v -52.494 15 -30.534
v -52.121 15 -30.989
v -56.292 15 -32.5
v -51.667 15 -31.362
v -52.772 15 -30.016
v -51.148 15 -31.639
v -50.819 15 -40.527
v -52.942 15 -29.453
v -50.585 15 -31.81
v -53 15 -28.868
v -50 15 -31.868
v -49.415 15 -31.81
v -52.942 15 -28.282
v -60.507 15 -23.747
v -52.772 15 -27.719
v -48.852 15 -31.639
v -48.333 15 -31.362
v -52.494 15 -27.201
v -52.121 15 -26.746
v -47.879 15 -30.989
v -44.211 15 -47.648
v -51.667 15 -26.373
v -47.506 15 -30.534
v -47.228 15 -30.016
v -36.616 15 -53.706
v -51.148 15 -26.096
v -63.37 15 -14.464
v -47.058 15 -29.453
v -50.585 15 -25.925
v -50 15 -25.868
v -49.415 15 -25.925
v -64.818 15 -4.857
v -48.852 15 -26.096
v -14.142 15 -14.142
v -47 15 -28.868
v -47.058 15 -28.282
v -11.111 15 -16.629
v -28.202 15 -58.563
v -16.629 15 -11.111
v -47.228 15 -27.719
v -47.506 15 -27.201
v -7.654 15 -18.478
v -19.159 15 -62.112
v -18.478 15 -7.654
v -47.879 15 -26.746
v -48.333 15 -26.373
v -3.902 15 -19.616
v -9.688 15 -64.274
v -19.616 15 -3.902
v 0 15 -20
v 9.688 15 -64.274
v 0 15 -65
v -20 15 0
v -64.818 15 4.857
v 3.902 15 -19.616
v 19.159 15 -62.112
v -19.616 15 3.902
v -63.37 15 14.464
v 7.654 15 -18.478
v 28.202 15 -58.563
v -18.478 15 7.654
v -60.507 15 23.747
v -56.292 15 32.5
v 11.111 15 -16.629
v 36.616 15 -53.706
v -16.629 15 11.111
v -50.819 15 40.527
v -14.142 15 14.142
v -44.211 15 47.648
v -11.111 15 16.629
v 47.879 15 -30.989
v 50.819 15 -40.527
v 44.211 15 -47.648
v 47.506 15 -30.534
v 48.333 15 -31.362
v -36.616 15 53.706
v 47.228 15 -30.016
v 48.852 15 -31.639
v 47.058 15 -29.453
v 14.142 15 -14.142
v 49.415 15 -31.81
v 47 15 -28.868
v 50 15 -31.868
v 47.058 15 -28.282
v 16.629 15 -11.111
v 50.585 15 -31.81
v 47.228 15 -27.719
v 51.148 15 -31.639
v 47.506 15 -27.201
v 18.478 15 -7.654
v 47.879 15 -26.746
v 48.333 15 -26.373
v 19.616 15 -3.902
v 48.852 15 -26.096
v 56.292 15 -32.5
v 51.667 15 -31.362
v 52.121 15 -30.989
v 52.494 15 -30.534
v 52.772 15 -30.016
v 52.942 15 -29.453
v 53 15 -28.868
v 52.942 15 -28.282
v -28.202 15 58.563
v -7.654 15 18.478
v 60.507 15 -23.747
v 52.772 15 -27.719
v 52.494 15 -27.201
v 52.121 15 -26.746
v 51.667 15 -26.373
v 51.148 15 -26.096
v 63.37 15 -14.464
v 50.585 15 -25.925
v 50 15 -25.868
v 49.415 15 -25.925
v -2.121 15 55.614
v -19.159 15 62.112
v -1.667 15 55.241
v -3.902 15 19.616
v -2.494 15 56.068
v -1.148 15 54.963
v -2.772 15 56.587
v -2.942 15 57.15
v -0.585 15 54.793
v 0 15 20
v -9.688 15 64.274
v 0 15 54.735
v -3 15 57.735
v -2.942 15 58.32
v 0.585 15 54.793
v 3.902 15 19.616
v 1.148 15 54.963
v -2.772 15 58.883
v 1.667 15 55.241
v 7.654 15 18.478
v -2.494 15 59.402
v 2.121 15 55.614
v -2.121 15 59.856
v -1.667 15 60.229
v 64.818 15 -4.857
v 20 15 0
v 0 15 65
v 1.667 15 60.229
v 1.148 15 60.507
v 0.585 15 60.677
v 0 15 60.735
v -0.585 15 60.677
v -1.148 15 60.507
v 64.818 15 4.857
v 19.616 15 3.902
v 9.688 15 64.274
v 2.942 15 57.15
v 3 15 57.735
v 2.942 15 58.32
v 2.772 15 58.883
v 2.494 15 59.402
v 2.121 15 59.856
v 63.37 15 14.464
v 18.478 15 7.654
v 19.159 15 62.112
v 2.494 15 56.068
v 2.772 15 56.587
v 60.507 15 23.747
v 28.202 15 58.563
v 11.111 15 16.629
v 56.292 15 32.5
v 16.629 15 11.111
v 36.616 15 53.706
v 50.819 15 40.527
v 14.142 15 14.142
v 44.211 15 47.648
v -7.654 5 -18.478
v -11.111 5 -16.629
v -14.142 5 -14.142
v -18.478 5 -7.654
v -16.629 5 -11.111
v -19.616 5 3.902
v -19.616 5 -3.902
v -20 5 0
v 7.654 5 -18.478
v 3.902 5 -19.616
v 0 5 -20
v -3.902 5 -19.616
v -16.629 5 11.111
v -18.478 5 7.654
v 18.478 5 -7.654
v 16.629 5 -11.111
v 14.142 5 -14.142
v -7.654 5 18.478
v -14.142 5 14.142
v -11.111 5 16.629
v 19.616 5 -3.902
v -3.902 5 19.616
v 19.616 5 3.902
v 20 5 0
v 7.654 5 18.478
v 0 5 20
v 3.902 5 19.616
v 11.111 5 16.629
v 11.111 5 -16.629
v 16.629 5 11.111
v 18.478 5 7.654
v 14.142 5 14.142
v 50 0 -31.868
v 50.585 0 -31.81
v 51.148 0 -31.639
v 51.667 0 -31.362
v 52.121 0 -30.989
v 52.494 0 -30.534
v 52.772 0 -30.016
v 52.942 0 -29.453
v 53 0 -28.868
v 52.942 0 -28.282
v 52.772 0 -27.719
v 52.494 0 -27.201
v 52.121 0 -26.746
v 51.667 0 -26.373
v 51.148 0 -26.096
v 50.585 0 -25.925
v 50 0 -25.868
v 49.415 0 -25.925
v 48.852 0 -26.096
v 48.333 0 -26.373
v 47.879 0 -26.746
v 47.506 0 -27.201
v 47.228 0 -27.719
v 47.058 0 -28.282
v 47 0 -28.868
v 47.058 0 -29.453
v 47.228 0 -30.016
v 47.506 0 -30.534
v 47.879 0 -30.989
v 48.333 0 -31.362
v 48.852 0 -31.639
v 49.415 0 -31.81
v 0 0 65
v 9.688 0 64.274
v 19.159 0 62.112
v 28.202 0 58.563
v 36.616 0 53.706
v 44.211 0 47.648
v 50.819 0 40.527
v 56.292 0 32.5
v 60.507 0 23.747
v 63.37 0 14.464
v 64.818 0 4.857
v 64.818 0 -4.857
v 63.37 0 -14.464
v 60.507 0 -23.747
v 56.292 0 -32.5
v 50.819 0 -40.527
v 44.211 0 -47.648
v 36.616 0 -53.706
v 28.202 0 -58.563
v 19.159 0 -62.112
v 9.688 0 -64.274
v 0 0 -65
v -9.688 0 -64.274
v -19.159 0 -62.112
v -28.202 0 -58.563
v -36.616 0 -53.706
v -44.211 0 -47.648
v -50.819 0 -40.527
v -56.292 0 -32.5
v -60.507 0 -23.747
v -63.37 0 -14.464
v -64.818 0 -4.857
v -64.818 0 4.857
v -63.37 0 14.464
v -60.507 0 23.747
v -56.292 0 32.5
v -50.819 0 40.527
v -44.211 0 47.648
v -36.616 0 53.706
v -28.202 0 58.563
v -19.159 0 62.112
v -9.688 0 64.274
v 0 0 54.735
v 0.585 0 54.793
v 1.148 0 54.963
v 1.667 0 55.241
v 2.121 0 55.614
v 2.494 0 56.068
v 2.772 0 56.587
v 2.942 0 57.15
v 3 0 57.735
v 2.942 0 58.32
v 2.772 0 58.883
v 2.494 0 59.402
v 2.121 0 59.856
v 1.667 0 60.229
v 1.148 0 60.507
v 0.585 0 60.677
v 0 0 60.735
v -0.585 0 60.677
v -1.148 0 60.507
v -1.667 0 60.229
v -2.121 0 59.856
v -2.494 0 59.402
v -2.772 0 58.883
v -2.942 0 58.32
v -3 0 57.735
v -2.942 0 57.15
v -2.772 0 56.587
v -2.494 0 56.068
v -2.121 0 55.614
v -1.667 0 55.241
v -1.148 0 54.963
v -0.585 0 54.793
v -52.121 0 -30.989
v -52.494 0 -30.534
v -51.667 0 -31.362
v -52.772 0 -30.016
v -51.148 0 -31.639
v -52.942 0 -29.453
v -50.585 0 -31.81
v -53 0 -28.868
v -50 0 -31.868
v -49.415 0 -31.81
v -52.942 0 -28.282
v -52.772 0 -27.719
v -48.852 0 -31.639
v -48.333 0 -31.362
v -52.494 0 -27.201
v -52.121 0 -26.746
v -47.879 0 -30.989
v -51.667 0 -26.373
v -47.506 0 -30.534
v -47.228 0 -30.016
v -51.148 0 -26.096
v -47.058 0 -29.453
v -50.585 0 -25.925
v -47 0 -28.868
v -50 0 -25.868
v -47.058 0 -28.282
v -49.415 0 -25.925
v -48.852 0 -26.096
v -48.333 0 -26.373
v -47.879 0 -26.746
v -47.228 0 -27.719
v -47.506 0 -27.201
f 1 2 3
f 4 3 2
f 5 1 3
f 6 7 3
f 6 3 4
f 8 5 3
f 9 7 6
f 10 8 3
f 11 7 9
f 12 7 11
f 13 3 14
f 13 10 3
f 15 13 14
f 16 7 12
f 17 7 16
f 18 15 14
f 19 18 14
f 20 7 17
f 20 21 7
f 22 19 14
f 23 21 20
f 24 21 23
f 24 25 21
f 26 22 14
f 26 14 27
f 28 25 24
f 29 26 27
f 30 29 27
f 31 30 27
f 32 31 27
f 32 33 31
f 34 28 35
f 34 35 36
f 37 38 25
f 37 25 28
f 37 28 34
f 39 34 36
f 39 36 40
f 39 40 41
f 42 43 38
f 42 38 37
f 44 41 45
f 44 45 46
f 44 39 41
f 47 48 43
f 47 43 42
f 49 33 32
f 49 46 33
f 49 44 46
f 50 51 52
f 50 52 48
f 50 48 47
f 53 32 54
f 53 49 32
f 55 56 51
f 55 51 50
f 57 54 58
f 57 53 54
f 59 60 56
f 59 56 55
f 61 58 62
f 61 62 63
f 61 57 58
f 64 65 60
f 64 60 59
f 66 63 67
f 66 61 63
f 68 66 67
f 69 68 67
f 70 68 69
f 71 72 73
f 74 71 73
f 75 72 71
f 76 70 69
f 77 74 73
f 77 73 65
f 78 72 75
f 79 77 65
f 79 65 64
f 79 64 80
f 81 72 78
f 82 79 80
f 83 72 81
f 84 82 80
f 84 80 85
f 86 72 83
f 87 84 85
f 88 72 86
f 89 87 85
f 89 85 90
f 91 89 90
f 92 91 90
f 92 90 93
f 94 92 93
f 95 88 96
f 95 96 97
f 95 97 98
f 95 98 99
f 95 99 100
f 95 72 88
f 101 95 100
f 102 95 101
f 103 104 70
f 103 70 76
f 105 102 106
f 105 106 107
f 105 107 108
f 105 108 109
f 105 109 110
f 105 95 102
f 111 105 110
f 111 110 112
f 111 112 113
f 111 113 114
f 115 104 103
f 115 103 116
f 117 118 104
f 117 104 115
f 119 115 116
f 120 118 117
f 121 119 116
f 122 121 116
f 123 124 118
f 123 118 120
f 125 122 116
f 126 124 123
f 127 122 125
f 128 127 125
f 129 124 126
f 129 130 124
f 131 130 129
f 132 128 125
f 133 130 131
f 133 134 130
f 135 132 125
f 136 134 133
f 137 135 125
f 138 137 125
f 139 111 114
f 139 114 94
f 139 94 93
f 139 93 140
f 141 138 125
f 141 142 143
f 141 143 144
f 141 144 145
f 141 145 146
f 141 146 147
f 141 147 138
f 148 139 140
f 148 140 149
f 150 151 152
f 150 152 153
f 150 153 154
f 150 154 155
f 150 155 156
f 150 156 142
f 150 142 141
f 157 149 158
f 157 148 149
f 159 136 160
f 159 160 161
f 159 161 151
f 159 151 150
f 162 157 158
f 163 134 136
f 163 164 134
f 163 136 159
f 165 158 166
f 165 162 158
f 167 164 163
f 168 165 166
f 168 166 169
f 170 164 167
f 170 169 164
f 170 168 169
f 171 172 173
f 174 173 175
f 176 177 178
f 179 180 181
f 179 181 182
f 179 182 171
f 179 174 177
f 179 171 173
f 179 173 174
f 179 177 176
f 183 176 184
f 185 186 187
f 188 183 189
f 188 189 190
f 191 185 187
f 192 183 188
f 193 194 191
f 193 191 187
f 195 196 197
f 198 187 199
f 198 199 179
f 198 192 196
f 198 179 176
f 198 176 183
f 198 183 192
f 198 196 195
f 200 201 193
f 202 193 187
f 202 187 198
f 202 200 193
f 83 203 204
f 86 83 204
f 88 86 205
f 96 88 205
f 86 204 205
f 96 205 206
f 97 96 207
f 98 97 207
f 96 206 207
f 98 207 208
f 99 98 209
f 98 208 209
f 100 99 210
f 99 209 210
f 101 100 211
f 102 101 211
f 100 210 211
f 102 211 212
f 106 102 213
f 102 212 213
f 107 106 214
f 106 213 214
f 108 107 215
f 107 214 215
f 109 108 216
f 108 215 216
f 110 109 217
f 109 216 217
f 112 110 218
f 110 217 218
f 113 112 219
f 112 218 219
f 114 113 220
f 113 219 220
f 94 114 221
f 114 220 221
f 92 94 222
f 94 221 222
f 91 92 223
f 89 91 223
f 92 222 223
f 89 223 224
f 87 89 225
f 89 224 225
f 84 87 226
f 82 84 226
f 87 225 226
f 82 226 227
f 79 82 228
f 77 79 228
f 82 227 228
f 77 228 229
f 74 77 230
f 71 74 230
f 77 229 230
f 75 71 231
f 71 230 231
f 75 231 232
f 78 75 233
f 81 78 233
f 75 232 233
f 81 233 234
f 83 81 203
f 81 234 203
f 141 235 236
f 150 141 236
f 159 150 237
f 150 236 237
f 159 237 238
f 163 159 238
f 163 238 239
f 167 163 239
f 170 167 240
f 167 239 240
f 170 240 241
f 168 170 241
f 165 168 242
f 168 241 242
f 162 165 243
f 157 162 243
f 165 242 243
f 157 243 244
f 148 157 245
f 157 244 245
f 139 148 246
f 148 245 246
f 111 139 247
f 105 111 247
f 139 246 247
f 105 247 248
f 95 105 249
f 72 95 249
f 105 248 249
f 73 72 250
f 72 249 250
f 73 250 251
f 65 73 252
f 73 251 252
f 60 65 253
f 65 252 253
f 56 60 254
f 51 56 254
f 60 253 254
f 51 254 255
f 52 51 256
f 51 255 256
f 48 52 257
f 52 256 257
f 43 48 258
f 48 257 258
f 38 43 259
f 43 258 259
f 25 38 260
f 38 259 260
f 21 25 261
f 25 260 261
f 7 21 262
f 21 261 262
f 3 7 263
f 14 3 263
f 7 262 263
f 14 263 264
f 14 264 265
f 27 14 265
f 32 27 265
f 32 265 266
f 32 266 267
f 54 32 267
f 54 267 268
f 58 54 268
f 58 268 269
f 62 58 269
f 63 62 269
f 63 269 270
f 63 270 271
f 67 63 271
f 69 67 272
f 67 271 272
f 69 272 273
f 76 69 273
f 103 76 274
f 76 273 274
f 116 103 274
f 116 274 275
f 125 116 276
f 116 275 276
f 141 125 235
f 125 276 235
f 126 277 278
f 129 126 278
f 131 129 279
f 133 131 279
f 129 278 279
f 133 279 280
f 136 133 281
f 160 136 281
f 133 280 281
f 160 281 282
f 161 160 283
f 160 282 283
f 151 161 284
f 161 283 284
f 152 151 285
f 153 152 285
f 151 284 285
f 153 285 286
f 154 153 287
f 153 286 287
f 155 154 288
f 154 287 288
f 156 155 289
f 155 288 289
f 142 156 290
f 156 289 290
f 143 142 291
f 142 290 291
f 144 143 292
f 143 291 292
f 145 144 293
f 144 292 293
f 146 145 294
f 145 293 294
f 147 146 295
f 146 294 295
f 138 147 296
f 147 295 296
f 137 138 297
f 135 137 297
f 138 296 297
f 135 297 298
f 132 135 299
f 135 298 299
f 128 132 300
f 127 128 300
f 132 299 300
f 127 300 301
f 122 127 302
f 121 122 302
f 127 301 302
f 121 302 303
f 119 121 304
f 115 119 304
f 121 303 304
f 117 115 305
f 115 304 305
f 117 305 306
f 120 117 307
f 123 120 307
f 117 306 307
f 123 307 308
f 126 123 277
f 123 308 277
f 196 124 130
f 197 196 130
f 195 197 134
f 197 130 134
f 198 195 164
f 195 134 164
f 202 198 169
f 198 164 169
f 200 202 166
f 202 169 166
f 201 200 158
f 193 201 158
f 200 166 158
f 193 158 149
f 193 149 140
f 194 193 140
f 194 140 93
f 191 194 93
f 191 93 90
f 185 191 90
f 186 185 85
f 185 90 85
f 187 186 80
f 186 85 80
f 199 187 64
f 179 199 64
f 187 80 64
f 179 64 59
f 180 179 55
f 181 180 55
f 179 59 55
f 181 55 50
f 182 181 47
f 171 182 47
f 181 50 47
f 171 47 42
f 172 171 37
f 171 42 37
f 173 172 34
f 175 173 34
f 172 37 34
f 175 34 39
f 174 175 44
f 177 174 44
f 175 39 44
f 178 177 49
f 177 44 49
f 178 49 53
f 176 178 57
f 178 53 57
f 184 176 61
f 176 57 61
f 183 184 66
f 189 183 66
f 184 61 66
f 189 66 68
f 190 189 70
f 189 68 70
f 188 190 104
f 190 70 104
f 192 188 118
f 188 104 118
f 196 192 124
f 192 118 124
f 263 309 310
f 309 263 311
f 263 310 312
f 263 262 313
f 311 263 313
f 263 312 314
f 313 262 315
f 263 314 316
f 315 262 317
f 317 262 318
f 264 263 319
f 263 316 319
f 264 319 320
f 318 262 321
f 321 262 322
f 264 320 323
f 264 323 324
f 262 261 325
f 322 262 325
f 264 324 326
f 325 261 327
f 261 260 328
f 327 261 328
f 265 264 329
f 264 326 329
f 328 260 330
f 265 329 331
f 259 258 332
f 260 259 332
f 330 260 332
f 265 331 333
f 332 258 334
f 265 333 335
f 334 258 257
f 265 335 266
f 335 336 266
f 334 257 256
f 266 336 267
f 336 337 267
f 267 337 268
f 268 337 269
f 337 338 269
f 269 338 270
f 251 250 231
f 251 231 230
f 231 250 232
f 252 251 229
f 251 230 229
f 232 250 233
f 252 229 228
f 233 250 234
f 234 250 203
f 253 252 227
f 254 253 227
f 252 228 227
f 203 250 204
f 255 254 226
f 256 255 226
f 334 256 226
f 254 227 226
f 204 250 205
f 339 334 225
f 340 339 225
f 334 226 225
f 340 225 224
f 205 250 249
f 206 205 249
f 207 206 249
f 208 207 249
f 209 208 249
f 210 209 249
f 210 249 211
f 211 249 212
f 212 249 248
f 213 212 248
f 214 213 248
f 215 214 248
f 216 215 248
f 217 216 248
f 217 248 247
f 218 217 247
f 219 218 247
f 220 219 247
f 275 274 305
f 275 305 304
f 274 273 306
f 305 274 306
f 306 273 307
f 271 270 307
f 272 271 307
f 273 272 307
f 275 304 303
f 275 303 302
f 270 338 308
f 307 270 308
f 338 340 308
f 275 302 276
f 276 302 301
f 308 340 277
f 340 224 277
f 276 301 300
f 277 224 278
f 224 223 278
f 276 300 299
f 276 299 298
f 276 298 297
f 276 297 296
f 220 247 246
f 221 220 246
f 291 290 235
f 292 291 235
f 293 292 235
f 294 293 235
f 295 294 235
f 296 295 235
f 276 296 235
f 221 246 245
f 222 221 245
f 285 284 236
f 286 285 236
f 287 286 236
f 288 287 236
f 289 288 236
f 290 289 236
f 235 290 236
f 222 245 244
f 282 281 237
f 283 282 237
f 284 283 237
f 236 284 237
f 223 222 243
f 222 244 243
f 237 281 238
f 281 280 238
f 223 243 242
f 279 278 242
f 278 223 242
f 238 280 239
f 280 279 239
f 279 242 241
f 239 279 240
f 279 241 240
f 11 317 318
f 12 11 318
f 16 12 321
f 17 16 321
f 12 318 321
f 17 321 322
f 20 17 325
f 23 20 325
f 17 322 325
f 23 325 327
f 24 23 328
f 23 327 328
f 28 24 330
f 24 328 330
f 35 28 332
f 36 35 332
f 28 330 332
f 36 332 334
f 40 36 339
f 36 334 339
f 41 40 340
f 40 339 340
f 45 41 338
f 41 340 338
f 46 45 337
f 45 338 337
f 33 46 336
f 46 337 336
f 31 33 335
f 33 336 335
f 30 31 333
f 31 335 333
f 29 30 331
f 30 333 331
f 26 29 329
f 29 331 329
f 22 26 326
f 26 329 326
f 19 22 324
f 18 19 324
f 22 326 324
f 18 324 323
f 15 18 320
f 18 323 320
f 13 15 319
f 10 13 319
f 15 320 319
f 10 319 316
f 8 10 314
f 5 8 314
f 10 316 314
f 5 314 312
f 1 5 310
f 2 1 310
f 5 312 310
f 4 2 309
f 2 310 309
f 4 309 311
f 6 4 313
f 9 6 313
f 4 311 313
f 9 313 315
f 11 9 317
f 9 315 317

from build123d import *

# Parameters (mm, degrees)
SKETCH_2_R          = 65
EXTRUDE_1_DEPTH     = 15
SKETCH_5_R          = 20
CUT_EXTRUDE_1_DEPTH = 10
SKETCH_6_R          = 3
CUT_EXTRUDE_2_DEPTH = 15


with BuildPart() as part:
    # Эскиз2 → Бобышка-Вытянуть1 (new body)
    with BuildSketch(Plane(origin=(0, 0, 0), x_dir=(1, 0, 0), z_dir=(0, 1, 0))):
        with Locations(Location((0, 0, 0), (0, 0, 270))):
            Circle(SKETCH_2_R)
    extrude(amount=EXTRUDE_1_DEPTH)

    # Эскиз5 → Вырез-Вытянуть1 (cut)
    with BuildSketch(Plane(origin=(0, 15, 0), x_dir=(1, 0, 0), z_dir=(0, 1, 0))):
        with Locations(Location((0, 0, 0), (0, 0, 270))):
            Circle(SKETCH_5_R)
    extrude(amount=-CUT_EXTRUDE_1_DEPTH, mode=Mode.SUBTRACT)

    # Эскиз6 → Вырез-Вытянуть2 (cut)
    with BuildSketch(Plane.XZ):
        with Locations(Location((0, 57.735026919, 0), (0, 0, 270))):
            Circle(SKETCH_6_R)
        with Locations(Location((-50, -28.867513459, 0), (0, 0, 270))):
            Circle(SKETCH_6_R)
        with Locations(Location((50, -28.867513459, 0), (0, 0, 270))):
            Circle(SKETCH_6_R)
    extrude(amount=-CUT_EXTRUDE_2_DEPTH, mode=Mode.SUBTRACT)


solid = part.part
